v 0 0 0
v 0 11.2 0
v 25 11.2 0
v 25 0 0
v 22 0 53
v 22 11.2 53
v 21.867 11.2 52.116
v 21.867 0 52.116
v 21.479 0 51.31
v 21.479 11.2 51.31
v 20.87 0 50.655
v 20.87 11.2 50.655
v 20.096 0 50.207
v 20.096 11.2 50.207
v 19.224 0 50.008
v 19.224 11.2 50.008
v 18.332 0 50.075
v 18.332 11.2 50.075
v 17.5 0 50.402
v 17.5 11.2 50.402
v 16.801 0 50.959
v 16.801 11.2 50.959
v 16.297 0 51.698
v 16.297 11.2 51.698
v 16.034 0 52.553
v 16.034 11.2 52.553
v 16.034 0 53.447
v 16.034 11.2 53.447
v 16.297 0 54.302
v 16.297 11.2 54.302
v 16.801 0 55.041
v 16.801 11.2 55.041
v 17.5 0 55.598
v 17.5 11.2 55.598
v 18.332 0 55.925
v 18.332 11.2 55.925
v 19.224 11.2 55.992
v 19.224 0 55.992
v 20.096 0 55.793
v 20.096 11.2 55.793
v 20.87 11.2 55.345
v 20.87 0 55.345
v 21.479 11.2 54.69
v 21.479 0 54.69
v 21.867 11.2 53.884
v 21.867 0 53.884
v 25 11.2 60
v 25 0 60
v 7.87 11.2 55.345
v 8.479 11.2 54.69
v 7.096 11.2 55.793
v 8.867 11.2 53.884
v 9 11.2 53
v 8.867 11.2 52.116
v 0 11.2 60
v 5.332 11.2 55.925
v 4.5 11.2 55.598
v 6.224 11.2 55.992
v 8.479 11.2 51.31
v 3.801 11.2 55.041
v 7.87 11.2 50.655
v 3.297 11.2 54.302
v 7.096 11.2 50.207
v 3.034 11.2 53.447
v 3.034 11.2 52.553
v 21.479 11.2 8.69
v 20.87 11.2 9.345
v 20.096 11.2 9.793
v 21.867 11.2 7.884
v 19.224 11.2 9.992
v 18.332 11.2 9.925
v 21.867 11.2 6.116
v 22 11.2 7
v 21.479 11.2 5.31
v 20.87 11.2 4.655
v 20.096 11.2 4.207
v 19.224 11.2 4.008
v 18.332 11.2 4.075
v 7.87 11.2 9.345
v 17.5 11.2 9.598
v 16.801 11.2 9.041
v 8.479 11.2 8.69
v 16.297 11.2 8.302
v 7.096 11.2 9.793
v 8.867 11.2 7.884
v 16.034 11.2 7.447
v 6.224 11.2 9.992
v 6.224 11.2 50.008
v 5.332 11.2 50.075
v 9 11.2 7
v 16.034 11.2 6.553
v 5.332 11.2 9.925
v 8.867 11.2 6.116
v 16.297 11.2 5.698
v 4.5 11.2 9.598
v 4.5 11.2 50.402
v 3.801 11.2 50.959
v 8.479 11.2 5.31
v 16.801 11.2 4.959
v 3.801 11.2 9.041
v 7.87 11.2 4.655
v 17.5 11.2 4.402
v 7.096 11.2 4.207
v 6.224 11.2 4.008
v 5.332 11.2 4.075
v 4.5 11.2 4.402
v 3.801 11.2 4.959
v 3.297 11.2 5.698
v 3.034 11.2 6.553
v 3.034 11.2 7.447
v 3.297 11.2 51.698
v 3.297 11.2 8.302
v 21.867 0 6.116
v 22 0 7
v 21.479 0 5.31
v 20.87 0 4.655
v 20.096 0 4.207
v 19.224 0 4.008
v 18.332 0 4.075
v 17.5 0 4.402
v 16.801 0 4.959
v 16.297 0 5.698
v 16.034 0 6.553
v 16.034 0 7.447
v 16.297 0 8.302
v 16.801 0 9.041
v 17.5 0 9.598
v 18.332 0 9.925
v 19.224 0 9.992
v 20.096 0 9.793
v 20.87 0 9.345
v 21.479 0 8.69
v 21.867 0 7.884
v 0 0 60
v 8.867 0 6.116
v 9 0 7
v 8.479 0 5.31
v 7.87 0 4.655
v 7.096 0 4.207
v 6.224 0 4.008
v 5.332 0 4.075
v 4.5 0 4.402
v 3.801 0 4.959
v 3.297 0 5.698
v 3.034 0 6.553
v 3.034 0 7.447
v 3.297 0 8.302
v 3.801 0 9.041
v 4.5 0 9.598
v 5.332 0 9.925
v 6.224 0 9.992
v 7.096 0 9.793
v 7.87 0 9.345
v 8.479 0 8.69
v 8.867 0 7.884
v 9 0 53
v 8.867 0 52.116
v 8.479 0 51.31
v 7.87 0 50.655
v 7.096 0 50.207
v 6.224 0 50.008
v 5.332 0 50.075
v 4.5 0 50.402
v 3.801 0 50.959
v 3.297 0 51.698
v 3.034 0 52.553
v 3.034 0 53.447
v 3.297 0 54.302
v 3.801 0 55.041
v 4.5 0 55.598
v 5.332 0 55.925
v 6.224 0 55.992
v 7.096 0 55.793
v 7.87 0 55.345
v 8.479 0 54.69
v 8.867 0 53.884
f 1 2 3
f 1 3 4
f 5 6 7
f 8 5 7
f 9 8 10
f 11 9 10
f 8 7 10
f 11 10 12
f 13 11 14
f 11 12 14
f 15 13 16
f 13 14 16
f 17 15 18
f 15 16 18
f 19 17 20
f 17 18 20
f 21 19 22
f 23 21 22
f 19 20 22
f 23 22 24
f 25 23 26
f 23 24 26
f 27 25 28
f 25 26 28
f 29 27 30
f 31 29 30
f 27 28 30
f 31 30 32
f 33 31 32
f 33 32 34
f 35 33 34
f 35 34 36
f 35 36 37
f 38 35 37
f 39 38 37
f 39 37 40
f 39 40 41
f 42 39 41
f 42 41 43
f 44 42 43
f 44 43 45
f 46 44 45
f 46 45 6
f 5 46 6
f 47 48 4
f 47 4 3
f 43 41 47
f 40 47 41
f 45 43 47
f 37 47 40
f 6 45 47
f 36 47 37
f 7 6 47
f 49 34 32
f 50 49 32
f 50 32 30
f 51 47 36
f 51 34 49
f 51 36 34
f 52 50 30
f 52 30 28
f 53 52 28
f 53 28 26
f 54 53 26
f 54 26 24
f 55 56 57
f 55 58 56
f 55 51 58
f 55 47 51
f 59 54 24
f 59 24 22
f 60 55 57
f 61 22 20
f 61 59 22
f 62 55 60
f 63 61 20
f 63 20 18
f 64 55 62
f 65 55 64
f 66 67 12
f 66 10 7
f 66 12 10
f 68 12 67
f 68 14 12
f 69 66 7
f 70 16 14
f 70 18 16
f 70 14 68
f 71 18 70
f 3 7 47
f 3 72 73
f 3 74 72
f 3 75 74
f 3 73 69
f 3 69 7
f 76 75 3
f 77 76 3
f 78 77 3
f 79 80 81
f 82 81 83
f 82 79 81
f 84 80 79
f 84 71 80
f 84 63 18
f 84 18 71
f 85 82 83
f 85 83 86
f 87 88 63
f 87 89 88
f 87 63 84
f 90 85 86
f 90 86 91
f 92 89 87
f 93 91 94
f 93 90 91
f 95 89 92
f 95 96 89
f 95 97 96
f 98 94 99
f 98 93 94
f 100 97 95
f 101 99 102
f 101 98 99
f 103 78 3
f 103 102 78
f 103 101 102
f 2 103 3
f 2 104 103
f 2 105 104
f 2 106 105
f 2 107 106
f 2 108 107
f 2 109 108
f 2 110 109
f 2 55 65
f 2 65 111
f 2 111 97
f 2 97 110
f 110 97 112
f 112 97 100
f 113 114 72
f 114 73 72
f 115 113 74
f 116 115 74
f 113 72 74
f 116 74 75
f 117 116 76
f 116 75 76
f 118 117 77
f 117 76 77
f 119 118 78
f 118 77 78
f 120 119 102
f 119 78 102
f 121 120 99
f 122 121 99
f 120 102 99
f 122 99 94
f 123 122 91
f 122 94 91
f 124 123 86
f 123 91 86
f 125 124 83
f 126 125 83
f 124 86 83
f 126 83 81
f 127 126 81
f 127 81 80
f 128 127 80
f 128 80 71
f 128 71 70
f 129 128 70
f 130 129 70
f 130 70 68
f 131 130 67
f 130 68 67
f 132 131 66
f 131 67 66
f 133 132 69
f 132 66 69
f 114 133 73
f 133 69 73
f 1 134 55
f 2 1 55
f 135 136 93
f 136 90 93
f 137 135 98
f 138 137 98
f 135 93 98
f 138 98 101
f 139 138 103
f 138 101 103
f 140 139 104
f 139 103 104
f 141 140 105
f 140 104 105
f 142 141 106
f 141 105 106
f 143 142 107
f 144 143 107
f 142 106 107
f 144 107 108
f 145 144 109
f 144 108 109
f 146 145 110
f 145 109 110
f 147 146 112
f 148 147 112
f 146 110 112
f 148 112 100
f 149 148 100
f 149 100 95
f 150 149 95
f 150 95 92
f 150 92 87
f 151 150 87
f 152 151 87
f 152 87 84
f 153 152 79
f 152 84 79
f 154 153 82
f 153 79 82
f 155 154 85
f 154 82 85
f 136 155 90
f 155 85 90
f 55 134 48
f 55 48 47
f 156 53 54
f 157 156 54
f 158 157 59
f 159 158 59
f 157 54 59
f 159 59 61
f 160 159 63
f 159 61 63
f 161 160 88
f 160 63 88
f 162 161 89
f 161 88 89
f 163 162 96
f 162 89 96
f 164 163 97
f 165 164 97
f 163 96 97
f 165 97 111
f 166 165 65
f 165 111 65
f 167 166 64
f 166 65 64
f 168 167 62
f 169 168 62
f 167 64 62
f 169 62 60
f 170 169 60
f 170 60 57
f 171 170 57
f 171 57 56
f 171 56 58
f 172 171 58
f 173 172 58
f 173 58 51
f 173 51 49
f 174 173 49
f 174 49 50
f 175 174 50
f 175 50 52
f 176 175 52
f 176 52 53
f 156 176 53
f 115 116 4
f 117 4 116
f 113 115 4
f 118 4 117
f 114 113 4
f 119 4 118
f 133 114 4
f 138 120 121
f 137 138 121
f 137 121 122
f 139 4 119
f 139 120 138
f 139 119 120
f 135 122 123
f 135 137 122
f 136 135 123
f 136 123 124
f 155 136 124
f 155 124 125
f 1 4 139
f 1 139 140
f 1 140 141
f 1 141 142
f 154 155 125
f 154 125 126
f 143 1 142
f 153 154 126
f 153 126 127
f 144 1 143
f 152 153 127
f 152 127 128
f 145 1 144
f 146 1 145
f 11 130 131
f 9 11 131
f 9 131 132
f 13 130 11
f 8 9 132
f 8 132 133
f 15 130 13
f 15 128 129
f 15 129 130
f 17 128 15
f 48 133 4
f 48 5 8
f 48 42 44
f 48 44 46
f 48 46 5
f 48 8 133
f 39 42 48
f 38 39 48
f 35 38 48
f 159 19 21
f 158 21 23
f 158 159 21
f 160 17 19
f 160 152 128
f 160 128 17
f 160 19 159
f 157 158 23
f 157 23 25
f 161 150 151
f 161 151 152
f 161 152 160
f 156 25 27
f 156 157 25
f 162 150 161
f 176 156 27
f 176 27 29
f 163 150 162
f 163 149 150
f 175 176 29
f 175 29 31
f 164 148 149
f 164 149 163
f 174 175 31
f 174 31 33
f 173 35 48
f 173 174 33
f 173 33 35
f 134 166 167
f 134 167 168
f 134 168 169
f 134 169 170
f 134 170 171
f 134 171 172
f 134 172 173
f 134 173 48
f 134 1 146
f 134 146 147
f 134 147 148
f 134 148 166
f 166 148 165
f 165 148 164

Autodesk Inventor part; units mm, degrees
ref_plane "YZ Plane" through (0, 0, 0) normal (1, 0, 0) x (0, 1, 0)
ref_plane "XZ Plane" through (0, 0, 0) normal (0, 1, 0) x (-1, 0, 0)
ref_plane "XY Plane" through (0, 0, 0) normal (0, 0, 1) x (1, 0, 0)
sketch "Sketch1" plane through (0, 0, 0) normal (1, 0, 0) x (0, 1, 0)
  line L0 (0, 0) -> (0, 60)
  line L1 (0, 60) -> (11.2, 60)
  line L2 (11.2, 60) -> (11.2, 0)
  line L3 (11.2, 0) -> (0, 0)
  dimension "d2" = 60
  dimension "d4" = 11.2
extrude "Extrusion1" add sketch "Sketch1" along normal blind 25
sketch "Sketch2" plane through (0, 11.2, 60) normal (0, 1, 0) x (1, 0, 0)
  circle A0 centre (6, 53) radius 3
  point P0 (0, 60)
  dimension "d7" = 6
  dimension "d8" = 6
  dimension "d9" = 7
extrude "Extrusion2" cut sketch "Sketch2" against normal blind 20
pattern_linear "Rectangular Pattern1" count 2 spacing 46 along (0, 0, 1) count 2 spacing 13 along (1, 0, 0) of "Extrusion2"
properties part number "BK10_3030_Mount"
